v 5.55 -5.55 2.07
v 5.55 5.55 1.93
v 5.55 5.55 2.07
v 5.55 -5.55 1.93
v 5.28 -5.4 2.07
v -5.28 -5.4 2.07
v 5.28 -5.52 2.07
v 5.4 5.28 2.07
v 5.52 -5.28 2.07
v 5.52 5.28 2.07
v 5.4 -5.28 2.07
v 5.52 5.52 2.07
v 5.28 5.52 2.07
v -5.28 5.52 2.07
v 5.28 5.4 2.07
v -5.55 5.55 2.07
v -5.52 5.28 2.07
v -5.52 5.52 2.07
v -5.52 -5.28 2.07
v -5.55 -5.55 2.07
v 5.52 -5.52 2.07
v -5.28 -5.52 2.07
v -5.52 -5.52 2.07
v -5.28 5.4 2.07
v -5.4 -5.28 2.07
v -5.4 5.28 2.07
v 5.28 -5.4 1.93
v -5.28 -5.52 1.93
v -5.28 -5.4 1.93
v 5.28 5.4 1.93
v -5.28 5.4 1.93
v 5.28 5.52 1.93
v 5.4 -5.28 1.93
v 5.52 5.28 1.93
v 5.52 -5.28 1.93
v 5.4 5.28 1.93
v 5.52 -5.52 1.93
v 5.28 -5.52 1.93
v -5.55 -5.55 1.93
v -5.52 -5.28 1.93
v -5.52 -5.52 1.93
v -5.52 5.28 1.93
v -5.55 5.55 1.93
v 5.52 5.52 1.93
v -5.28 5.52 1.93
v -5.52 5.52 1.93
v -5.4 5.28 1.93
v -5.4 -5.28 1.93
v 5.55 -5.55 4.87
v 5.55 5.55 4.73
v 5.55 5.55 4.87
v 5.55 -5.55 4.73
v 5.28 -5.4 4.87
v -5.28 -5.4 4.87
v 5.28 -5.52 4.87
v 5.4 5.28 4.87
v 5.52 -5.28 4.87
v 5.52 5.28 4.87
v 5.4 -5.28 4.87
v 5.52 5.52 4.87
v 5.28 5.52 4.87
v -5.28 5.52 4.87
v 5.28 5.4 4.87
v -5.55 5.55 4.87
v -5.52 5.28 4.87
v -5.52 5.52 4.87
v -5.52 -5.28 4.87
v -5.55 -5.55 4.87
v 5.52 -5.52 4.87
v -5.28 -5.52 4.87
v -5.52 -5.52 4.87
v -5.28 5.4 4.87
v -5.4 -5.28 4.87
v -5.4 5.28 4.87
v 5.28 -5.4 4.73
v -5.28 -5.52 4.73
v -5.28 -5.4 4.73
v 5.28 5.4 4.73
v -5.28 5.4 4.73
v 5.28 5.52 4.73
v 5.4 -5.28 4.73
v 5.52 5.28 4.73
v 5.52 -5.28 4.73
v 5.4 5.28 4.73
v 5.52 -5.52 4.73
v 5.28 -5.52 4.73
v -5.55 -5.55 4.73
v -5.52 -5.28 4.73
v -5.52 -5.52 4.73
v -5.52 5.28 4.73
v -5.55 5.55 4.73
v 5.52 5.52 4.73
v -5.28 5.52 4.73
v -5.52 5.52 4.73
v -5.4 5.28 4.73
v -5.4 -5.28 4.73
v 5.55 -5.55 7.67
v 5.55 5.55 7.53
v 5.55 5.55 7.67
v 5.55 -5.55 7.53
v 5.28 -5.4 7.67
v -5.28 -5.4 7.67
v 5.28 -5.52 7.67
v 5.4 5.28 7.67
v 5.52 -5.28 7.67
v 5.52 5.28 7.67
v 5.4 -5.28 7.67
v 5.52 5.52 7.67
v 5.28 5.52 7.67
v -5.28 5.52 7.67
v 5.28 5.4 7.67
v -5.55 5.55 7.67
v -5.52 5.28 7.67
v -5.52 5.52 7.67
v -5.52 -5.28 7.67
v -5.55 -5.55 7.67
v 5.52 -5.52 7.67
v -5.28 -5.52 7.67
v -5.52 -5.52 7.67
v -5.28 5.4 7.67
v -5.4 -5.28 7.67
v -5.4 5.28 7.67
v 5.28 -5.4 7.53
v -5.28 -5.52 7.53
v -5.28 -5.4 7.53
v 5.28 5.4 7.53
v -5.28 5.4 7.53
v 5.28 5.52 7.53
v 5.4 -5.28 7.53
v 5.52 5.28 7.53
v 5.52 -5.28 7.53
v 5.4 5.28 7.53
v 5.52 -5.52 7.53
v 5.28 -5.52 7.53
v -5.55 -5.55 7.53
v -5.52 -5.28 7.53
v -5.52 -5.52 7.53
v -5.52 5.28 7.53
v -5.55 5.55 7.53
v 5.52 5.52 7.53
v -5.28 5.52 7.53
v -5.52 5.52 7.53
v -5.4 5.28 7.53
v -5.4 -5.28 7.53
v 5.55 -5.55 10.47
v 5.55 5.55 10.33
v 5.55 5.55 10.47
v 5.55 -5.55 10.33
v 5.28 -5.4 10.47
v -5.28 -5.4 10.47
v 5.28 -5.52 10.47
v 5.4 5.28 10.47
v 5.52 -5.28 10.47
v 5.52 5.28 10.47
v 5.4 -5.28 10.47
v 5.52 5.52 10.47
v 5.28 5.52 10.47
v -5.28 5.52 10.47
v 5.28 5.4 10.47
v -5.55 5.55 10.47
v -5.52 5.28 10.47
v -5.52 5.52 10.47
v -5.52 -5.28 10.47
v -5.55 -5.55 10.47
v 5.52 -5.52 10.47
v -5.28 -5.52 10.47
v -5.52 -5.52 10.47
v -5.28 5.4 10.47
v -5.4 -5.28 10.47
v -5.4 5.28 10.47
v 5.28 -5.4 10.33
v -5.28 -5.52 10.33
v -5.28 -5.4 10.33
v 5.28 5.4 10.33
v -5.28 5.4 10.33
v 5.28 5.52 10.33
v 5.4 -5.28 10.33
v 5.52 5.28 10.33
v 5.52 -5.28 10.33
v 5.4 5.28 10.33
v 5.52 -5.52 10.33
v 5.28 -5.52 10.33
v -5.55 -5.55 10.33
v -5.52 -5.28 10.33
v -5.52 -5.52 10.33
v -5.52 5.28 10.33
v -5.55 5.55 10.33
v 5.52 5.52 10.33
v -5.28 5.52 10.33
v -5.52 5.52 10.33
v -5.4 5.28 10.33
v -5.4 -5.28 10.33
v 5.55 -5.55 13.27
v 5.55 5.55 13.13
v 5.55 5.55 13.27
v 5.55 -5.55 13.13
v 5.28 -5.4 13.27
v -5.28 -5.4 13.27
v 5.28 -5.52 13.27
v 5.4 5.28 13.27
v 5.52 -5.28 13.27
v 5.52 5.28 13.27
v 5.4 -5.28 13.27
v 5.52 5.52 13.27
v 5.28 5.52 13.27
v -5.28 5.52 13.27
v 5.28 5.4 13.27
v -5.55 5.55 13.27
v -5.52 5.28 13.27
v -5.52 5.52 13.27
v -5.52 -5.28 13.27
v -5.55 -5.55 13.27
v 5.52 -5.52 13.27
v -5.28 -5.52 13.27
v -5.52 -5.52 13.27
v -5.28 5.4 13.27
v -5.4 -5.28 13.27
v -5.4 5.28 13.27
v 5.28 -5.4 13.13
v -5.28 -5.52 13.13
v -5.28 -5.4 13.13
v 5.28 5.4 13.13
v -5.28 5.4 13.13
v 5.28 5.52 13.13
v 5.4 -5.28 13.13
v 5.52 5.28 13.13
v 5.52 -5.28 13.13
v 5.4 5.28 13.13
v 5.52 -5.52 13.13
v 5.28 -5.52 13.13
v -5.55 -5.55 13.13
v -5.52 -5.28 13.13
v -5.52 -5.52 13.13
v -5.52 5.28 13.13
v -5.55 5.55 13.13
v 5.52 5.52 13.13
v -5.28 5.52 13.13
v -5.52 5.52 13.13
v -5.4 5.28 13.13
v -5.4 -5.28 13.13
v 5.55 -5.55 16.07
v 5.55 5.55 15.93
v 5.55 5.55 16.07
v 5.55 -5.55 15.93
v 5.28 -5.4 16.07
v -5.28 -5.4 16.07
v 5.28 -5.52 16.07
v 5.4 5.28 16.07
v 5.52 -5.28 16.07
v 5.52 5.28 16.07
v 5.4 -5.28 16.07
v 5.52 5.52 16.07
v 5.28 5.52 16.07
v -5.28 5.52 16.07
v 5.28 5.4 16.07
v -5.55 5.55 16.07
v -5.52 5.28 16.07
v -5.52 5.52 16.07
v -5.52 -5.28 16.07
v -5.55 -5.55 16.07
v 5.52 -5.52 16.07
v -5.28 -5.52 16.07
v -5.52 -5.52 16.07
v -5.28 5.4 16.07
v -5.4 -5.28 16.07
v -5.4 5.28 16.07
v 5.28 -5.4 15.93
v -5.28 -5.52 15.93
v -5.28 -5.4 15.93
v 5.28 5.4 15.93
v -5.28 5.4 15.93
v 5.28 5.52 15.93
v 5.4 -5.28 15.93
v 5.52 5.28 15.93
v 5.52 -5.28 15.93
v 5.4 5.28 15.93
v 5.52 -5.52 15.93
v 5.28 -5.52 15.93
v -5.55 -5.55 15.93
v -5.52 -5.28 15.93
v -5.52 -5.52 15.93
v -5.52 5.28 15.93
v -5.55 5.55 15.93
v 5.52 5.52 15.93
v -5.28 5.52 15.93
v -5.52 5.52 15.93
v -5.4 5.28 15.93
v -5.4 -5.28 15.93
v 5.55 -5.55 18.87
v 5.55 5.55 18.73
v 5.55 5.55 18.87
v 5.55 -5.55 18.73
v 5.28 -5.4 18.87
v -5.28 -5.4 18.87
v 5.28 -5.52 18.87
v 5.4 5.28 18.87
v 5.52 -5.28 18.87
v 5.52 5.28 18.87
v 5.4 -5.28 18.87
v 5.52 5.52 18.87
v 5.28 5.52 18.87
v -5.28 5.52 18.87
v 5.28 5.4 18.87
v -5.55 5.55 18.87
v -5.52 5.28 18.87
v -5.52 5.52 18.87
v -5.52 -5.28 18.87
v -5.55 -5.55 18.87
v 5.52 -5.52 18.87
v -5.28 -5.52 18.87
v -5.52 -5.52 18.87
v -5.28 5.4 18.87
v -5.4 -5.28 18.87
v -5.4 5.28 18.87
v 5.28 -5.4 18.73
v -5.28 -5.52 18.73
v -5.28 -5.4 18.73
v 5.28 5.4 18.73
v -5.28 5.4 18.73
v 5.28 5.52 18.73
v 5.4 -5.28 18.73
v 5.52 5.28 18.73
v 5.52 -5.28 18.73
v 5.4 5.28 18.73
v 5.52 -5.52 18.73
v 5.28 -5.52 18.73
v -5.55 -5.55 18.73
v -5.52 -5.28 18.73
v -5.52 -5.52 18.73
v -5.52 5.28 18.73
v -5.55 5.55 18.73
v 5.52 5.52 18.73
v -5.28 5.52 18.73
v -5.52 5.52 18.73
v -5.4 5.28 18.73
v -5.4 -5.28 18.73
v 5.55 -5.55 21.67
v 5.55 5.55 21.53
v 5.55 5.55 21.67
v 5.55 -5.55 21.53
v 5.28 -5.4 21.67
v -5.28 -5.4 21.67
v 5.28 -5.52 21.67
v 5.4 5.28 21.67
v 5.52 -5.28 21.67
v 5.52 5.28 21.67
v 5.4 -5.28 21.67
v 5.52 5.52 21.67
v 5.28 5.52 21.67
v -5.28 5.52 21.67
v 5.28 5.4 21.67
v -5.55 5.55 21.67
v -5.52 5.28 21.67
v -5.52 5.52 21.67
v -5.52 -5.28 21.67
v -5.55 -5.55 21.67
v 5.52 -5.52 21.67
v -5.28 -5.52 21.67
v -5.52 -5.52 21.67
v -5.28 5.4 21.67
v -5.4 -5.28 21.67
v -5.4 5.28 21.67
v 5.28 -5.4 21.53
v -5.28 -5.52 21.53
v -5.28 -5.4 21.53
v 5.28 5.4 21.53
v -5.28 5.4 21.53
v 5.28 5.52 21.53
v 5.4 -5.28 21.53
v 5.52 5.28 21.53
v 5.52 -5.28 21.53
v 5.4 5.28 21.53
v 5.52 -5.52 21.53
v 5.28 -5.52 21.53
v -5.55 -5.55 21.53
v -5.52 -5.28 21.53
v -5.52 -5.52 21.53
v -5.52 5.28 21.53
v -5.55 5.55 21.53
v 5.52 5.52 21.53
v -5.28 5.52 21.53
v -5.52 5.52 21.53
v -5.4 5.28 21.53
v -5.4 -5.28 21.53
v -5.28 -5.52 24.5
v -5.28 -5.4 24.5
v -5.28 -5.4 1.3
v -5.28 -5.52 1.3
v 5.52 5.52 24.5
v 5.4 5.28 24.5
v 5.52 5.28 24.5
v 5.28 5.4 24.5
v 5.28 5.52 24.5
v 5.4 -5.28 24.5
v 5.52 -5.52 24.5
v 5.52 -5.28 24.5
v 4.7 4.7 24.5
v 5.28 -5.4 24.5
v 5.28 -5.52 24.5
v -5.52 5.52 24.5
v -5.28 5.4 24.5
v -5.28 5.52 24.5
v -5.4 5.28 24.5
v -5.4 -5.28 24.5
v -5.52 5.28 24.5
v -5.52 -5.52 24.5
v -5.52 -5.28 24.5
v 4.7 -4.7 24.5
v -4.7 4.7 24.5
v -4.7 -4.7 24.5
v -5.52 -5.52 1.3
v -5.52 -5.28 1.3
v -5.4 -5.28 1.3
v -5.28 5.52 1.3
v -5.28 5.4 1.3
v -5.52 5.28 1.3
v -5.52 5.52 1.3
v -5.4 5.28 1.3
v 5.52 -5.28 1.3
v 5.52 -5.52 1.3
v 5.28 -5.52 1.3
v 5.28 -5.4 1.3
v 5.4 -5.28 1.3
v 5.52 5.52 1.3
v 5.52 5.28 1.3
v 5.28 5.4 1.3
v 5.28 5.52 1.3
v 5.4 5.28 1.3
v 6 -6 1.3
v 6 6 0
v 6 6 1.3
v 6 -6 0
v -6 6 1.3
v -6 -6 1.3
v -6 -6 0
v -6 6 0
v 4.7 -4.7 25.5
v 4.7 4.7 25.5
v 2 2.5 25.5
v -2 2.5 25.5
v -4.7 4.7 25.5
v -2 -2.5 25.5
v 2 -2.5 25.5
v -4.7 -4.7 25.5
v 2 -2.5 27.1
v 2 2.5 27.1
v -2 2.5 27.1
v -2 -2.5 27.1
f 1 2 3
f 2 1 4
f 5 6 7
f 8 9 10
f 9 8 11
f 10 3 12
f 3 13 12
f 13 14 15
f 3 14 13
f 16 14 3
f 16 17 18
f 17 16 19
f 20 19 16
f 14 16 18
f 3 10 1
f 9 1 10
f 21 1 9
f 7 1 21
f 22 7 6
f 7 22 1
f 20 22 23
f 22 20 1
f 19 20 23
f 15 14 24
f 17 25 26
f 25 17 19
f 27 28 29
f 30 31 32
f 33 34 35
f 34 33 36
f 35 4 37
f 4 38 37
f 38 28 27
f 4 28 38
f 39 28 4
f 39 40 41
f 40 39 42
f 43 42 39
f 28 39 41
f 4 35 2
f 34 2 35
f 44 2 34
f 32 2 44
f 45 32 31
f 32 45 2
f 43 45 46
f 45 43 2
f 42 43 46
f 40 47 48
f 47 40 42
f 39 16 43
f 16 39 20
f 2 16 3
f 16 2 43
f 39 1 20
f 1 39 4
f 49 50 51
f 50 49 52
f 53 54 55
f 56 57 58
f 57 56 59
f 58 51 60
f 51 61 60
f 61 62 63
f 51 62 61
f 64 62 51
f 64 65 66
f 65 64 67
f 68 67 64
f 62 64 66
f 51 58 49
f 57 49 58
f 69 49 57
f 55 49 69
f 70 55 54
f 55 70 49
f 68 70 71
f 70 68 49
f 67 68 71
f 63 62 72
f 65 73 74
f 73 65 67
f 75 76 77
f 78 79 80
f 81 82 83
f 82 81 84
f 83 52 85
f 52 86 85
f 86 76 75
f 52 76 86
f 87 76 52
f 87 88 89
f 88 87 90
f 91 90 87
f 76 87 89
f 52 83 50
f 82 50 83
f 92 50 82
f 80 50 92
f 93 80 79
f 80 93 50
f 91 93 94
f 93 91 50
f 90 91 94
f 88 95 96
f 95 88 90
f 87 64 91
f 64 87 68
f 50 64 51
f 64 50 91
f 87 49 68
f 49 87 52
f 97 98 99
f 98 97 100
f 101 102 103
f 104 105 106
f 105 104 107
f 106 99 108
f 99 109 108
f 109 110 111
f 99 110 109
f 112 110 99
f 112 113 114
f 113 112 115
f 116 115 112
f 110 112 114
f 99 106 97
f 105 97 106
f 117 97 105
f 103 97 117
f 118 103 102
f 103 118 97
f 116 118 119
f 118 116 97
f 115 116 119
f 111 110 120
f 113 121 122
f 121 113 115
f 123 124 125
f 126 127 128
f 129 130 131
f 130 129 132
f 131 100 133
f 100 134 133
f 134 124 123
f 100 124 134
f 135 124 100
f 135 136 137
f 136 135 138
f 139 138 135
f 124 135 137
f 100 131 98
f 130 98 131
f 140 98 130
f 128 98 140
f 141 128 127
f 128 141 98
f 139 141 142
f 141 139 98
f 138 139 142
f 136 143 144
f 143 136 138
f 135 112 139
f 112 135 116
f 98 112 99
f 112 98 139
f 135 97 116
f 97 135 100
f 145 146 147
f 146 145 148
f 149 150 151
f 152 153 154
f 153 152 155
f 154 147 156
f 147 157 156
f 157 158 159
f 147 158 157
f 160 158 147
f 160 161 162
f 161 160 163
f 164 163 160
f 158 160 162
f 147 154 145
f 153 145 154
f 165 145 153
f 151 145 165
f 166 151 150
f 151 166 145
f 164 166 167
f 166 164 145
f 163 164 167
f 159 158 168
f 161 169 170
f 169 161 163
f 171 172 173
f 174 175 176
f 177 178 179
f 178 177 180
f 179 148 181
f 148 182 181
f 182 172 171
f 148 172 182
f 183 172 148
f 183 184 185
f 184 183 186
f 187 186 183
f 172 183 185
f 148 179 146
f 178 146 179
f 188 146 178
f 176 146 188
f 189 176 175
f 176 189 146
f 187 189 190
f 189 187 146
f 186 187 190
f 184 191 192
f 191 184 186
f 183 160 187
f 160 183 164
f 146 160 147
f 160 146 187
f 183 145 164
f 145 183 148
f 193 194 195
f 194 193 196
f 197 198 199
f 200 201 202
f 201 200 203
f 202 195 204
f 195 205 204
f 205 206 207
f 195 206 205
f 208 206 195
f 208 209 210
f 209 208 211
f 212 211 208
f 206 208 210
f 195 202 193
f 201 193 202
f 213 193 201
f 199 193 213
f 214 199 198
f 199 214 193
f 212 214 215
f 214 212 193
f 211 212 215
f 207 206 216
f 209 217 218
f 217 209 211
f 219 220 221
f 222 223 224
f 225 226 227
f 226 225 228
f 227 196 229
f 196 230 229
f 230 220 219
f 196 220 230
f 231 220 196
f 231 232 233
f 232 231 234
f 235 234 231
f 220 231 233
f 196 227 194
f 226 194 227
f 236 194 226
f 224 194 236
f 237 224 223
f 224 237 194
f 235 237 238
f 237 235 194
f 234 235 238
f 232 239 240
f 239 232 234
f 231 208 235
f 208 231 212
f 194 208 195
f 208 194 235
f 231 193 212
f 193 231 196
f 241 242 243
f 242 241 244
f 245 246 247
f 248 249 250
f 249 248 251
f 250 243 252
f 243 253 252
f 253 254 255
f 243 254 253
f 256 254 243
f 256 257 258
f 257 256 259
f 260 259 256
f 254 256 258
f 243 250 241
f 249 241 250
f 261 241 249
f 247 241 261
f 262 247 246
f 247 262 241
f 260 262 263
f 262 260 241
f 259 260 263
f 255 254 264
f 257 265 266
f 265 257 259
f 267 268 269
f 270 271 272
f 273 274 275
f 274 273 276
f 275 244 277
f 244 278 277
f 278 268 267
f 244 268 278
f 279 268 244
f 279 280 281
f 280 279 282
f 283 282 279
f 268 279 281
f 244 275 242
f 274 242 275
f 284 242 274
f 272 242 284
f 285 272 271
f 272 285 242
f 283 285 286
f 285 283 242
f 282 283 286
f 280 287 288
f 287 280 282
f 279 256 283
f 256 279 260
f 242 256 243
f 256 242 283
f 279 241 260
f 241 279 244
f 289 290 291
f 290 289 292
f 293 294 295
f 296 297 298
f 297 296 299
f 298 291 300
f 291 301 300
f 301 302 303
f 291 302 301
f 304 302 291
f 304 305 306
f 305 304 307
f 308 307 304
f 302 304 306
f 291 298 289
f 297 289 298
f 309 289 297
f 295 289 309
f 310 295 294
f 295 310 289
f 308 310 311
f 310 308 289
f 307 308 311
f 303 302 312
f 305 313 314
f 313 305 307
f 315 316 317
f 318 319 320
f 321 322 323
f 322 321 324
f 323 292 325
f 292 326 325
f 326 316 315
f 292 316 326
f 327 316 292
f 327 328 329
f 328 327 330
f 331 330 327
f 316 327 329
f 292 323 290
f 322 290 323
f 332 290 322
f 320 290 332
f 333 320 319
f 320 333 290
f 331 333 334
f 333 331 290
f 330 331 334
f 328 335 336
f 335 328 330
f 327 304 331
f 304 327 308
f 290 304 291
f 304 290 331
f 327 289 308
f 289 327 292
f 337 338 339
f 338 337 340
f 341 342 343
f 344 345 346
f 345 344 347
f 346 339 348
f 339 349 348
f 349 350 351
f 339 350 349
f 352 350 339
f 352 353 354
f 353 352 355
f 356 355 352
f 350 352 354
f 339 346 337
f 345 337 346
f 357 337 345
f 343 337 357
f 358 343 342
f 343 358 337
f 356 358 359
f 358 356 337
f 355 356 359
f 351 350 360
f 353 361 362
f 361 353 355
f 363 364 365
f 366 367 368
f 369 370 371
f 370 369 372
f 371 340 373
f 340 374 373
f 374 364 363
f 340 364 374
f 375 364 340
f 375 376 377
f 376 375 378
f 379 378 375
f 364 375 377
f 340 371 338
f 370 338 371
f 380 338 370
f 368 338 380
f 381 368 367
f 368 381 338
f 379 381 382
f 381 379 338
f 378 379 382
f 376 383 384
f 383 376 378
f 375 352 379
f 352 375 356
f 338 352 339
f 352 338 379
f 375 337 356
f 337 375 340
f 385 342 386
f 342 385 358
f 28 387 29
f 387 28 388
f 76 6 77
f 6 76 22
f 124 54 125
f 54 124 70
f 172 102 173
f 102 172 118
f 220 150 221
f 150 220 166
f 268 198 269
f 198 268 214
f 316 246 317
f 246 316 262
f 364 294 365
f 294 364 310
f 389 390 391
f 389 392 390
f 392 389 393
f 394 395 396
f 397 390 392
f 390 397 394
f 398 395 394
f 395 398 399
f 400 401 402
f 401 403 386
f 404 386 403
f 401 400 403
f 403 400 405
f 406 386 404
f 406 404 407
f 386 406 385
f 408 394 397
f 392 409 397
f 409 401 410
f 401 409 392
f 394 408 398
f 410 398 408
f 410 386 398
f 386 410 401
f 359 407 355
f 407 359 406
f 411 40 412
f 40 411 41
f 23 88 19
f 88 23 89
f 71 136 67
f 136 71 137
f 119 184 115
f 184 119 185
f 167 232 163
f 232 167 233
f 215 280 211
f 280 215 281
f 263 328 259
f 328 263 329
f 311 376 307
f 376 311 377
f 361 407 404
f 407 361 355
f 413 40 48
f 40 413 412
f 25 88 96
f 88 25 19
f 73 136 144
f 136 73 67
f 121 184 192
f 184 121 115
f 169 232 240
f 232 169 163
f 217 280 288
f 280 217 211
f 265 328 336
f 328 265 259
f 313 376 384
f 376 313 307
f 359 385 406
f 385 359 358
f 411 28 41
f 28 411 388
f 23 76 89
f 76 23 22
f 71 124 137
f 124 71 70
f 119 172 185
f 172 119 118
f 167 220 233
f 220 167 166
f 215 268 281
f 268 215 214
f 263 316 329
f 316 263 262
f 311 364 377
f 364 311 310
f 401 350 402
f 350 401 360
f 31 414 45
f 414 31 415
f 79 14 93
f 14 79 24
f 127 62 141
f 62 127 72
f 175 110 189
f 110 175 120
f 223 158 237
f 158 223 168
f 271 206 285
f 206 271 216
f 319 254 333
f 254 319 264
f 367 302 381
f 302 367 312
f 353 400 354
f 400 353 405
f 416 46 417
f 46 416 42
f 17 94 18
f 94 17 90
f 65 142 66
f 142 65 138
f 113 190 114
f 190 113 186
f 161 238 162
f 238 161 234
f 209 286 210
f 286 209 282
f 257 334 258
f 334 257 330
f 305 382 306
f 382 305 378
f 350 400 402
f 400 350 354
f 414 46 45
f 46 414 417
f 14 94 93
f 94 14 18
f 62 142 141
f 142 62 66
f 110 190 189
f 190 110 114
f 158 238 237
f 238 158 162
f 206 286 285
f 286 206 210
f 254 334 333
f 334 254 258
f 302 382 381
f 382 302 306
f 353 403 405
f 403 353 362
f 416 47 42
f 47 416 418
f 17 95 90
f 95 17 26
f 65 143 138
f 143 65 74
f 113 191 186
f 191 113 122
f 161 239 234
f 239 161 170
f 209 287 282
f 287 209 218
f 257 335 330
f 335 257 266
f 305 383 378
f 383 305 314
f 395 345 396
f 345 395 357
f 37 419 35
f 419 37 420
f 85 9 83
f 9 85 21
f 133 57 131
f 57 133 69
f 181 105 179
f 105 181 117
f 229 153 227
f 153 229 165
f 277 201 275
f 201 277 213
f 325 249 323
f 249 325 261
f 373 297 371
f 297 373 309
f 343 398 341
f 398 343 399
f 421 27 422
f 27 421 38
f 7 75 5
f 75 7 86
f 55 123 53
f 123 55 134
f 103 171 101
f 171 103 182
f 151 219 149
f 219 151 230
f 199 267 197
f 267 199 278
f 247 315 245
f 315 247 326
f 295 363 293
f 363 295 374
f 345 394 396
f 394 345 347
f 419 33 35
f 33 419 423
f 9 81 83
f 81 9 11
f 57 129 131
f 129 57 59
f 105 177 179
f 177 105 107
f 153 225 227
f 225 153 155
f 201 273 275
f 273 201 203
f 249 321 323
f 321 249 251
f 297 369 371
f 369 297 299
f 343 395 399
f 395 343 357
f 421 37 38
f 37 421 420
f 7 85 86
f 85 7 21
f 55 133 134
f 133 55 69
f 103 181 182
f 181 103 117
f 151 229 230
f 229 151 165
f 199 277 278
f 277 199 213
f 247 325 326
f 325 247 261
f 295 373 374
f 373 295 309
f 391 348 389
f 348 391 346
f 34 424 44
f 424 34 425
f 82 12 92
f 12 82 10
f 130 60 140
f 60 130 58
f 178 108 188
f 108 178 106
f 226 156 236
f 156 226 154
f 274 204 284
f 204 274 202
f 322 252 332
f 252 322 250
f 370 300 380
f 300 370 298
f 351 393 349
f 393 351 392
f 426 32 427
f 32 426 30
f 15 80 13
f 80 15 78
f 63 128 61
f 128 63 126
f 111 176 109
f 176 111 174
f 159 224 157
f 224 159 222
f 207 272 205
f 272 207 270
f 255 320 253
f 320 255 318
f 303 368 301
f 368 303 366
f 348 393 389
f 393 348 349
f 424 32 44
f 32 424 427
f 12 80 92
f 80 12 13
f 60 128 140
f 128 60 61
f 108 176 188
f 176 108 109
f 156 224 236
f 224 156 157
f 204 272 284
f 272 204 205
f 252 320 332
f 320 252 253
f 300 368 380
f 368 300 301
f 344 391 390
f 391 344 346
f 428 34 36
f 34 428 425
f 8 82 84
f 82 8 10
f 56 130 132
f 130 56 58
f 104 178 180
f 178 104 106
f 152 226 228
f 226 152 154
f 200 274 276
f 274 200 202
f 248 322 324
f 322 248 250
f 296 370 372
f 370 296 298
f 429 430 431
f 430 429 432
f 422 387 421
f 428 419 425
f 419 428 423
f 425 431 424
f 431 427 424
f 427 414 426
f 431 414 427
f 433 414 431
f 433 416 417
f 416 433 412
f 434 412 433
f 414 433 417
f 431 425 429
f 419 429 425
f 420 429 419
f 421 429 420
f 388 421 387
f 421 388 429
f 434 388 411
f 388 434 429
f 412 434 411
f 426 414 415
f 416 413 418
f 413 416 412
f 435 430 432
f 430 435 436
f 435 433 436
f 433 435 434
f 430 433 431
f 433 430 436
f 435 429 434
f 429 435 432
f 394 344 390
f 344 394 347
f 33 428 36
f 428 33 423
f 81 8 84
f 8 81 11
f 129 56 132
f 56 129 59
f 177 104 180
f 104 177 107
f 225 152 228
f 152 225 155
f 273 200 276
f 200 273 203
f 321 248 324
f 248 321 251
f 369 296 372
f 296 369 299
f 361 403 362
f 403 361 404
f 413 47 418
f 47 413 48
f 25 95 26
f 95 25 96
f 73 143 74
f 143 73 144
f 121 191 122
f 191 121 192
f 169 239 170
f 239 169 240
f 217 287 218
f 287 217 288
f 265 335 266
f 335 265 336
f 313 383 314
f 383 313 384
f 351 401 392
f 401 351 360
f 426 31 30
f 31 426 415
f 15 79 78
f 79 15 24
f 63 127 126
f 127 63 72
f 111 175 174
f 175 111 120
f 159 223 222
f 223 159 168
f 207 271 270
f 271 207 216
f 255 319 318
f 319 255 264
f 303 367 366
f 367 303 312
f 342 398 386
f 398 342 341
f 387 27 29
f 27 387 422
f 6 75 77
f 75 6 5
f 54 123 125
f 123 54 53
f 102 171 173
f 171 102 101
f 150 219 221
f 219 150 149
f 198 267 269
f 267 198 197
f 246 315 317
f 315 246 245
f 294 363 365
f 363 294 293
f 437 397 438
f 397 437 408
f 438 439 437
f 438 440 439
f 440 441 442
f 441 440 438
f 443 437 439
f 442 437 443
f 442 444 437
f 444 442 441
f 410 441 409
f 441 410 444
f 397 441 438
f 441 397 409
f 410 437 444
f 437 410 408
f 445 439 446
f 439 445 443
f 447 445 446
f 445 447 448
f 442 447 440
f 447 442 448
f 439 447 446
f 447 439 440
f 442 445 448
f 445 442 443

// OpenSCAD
// Original reusable city kit. Metres, Z-up; bake.py converts to Y-up.
part = "tower";
$fn = 12;
module block(p, s) { translate(p) cube(s, center=true); }
module tower(floors=8) {
    height=floors*2.8+1.6;
    block([0,0,0.65],[12,12,1.3]);
    block([0,0,height*0.5+0.5],[10.8,10.8,height]);
    block([0,0,height+1],[9.4,9.4,1]);
    block([0,0,height+2.3],[4,5,1.6]);
    for(z=[2:2.8:height]) block([0,0,z],[11.1,11.1,0.14]);
    for(x=[-5.4,5.4]) for(y=[-5.4,5.4]) block([x,y,height*0.5+0.5],[0.24,0.24,height]);
}
module windows(lit,floors=8) {
    for(f=[0:floors-1]) for(c=[0:5]) for(side=[0:3])
        if (((f*17+c*7+side*13)%11<7)==lit)
            rotate([0,0,90*side]) block([-4.4+c*1.76,-5.415,3.0+f*2.8],[1.1,0.035,1.65]);
}
module lamp() {
    cylinder(h=0.3,r1=0.32,r2=0.22);
    translate([0,0,0.3]) cylinder(h=6.5,r1=0.105,r2=0.065);
    block([0.85,0,6.65],[1.8,0.14,0.14]);
    block([1.65,0,6.56],[0.9,0.42,0.18]);
}
module signal() {
    cylinder(h=0.2,r=0.22);
    cylinder(h=3.8,r=0.075);
    block([0,0,3.45],[0.5,0.32,1.42]);
    for(z=[2.99,3.45,3.91]) block([0,-0.24,z+0.13],[0.55,0.38,0.07]);
}
if(part=="tower") tower();
if(part=="lit") windows(true);
if(part=="dark") windows(false);
if(part=="tower-high") tower(16);
if(part=="lit-high") windows(true,16);
if(part=="dark-high") windows(false,16);
if(part=="lamp") lamp();
if(part=="lamp-glow") block([1.65,0,6.455],[0.76,0.34,0.025]);
if(part=="signal") signal();
if(part=="lens") rotate([90,0,0]) cylinder(h=0.025,r=0.17,center=true,$fn=16);
